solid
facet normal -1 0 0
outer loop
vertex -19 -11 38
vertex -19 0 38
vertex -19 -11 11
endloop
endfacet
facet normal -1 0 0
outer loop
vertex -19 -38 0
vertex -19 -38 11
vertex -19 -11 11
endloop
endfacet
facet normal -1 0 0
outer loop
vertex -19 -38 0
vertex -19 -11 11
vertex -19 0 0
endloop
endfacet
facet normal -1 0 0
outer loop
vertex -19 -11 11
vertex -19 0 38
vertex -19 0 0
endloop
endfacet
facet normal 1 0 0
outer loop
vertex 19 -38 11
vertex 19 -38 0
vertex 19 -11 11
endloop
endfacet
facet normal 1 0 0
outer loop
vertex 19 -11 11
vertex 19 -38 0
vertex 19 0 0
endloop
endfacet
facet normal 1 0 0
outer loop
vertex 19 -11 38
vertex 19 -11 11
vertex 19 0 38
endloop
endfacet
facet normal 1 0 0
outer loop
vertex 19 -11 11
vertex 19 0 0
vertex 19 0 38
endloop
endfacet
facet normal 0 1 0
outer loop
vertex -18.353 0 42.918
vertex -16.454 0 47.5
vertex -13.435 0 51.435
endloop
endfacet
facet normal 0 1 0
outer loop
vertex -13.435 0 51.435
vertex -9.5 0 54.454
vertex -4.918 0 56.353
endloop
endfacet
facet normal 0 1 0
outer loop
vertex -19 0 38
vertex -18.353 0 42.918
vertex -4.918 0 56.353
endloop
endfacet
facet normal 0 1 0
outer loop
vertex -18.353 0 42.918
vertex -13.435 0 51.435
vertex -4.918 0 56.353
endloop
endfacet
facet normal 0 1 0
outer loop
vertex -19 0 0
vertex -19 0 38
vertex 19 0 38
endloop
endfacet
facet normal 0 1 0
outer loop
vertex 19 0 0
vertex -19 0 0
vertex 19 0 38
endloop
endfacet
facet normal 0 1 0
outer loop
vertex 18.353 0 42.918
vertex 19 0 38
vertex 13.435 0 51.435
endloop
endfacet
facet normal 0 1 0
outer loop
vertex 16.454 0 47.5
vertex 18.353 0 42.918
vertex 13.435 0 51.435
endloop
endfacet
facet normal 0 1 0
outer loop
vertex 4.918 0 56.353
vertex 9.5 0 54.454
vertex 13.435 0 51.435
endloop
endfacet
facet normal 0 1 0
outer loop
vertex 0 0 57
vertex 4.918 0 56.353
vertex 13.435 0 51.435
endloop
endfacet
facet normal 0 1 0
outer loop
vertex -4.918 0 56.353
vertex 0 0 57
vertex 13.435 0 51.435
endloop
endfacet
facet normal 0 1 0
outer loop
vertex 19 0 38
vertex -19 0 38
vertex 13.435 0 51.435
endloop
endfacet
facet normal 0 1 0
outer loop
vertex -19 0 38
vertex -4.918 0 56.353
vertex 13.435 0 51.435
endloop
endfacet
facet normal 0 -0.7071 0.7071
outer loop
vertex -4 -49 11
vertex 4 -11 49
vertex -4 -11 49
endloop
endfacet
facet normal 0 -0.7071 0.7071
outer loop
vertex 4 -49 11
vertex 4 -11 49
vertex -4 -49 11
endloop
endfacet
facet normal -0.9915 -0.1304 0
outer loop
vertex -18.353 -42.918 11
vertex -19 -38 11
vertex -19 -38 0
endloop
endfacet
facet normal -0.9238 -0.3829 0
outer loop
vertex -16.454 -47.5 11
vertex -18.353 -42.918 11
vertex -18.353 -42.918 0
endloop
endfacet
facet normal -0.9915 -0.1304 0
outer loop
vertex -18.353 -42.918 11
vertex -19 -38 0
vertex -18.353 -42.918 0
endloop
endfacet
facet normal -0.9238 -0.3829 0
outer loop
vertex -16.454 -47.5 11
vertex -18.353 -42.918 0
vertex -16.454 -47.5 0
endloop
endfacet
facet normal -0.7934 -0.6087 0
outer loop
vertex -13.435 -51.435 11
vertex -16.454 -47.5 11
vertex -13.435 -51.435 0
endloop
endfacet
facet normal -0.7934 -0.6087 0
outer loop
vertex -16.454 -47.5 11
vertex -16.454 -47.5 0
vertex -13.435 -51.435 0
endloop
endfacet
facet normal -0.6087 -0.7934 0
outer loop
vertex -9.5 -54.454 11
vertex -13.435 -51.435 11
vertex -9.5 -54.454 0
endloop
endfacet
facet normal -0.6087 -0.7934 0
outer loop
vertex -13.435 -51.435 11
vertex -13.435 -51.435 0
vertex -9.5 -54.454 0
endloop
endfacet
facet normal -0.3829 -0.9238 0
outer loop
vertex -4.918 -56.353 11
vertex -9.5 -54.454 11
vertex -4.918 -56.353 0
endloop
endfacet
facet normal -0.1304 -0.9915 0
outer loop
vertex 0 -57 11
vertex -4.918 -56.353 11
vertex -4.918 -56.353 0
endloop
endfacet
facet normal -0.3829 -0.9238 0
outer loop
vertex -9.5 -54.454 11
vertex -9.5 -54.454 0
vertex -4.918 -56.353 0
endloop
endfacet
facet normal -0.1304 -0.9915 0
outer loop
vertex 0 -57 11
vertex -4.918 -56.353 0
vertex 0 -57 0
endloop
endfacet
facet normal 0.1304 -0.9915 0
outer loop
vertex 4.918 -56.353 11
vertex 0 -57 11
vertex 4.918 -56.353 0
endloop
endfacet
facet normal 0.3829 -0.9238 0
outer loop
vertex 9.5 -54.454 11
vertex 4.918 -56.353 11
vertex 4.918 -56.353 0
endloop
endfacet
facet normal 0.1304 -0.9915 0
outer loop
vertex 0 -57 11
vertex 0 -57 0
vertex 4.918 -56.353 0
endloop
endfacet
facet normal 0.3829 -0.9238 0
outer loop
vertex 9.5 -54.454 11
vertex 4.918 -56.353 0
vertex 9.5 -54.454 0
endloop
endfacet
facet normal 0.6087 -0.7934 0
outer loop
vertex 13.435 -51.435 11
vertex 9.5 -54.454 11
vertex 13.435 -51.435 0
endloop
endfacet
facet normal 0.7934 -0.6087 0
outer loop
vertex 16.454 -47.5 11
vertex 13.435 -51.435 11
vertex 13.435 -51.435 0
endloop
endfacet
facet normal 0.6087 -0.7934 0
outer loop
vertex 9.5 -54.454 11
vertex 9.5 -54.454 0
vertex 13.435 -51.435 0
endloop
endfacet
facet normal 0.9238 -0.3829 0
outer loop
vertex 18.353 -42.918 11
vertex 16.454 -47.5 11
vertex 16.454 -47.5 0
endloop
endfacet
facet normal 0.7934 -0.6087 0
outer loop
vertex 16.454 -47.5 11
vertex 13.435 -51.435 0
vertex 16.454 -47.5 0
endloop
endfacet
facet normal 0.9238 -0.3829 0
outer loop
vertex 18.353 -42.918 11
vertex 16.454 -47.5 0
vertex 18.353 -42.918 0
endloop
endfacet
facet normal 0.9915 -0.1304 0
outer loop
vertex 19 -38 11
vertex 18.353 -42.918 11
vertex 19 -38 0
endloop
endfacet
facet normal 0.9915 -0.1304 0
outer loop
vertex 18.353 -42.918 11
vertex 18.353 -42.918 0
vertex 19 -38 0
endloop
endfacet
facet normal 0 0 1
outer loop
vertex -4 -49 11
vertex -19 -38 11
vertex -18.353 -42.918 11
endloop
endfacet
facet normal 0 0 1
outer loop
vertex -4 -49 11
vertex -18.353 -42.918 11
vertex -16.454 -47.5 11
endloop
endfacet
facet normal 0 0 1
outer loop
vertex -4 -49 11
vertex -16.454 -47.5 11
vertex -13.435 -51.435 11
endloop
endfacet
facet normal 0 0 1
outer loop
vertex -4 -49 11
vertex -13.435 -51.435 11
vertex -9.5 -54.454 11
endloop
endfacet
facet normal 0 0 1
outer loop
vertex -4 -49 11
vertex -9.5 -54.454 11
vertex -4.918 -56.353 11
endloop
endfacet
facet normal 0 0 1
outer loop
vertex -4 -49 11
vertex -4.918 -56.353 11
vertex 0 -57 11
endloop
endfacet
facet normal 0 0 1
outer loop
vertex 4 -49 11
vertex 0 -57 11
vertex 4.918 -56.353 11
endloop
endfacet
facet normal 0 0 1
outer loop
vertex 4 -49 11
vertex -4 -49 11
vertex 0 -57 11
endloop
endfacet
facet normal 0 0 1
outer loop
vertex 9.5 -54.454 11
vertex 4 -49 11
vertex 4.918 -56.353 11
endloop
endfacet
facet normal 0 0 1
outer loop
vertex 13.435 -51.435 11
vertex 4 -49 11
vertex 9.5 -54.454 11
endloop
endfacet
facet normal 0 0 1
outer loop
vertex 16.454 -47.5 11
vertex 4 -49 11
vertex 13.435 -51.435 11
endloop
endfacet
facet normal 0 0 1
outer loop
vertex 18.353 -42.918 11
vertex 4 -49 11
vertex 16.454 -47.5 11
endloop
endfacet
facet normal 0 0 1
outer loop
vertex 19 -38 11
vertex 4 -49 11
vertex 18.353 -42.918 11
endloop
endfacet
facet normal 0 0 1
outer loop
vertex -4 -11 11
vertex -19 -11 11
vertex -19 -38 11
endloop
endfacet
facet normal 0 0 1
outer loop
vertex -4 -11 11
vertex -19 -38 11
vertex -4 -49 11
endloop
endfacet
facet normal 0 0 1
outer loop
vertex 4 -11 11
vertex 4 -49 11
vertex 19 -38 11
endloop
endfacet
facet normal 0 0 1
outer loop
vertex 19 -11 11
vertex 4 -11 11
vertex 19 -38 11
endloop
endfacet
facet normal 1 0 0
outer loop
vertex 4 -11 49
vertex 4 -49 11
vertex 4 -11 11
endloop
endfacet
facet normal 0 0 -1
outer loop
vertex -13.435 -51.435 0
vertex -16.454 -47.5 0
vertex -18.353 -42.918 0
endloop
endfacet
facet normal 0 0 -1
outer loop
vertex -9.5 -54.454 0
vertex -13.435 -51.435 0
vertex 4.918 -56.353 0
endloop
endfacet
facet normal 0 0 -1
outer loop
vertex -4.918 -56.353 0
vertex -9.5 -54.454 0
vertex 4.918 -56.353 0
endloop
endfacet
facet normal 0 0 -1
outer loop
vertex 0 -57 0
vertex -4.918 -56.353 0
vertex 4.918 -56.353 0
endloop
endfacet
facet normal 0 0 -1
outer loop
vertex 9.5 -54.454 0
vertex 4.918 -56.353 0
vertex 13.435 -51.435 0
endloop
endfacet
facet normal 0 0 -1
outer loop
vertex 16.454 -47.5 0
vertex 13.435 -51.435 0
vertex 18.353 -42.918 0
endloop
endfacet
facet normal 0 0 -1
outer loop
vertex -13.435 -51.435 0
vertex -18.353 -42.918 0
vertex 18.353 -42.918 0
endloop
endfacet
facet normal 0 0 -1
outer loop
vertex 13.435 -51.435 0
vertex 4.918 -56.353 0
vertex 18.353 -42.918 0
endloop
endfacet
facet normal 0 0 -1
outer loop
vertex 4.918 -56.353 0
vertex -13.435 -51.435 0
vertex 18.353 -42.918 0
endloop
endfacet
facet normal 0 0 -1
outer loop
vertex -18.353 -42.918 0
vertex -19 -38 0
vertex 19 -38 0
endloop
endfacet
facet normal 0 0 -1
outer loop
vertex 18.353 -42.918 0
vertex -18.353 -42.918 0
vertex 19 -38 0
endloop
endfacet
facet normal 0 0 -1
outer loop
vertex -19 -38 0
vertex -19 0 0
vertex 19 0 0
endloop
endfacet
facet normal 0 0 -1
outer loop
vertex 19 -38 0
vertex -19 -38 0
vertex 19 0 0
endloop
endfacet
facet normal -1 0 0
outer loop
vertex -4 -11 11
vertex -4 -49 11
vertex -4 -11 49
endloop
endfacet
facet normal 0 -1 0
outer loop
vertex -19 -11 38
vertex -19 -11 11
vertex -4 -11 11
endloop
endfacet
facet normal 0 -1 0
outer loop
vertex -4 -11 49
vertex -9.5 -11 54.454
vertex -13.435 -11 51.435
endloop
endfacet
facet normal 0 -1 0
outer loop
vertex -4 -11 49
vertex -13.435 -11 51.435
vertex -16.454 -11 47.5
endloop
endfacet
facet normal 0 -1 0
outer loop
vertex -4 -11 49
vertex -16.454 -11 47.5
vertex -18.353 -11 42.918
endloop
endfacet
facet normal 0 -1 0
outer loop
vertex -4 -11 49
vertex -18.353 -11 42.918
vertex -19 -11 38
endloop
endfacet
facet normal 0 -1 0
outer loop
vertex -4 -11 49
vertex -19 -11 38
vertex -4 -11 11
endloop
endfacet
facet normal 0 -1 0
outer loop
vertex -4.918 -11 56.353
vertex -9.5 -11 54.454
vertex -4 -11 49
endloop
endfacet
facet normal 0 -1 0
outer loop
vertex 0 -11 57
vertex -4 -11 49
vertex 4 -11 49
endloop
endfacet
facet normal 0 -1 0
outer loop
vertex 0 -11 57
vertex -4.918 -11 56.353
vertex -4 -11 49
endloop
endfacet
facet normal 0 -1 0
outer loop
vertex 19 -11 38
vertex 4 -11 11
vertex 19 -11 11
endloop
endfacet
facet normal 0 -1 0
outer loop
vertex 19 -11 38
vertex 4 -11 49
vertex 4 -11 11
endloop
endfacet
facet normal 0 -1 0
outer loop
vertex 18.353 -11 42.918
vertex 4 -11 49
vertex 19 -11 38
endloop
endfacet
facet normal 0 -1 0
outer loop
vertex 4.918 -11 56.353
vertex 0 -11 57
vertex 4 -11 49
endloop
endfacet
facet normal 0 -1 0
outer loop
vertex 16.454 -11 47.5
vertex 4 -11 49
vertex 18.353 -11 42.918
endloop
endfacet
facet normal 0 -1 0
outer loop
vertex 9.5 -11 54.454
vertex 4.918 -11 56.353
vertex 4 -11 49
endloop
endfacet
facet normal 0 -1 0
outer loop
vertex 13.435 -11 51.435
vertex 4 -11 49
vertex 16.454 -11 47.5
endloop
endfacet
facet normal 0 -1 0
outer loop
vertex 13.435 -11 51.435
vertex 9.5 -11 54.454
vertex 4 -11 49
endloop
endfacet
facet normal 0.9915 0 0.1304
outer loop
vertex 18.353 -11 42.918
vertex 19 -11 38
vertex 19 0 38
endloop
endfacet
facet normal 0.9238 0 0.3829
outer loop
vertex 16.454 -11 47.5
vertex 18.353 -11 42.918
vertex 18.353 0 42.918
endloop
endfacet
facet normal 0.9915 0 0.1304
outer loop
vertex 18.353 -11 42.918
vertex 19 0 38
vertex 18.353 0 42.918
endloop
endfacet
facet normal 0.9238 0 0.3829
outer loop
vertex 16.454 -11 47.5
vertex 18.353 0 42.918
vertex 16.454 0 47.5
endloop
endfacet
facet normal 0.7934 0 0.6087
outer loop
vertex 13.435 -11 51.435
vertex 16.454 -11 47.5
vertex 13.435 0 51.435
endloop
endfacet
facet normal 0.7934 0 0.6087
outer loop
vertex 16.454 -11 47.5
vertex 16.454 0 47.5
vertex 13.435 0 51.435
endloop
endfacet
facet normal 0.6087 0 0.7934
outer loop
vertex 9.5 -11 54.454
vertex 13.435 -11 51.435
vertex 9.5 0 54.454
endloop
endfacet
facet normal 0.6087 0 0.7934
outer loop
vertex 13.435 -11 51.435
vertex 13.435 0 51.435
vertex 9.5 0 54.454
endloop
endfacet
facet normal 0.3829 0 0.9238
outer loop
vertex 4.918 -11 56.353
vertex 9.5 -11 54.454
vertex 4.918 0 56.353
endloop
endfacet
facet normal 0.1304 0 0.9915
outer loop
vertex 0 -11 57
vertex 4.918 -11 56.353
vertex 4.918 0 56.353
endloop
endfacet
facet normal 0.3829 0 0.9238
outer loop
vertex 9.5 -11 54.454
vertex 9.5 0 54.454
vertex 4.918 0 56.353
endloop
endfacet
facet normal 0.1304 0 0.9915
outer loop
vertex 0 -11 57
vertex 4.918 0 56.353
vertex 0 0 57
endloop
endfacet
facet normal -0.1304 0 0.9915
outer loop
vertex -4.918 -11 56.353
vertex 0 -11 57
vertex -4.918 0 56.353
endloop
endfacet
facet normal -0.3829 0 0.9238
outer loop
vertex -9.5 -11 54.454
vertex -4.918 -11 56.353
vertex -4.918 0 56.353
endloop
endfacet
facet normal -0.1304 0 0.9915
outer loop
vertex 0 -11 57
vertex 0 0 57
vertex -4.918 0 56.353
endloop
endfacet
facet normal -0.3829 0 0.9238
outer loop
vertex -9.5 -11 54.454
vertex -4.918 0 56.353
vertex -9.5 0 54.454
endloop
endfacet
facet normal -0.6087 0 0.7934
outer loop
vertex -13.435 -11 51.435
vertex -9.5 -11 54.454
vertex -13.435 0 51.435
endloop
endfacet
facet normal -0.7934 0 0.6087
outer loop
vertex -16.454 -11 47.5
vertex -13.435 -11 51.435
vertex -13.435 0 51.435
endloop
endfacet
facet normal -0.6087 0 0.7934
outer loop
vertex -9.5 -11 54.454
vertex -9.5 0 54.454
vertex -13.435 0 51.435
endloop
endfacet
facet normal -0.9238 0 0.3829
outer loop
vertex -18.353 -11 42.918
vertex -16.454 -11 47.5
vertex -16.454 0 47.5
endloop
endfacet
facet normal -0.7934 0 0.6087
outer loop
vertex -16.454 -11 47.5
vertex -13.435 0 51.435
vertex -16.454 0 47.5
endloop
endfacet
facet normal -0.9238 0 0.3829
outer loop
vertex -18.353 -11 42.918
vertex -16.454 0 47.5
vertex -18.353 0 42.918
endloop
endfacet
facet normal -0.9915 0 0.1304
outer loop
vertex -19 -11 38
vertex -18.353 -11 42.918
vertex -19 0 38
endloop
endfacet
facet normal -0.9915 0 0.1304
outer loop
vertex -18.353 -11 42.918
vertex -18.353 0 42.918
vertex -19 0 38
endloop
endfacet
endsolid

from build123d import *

# Parameters (mm, degrees)
F1_DEPTH = 11
F3_DEPTH = 11
F5_DEPTH = 4


with BuildPart() as f1:
    # F0 (on Front) → F1 (new body)
    with BuildSketch(Plane.XZ):
        with BuildLine():
            Line((-19, 38), (-19, 0))
            Line((-19, 0), (19, 0))
            Line((19, 0), (19, 38))
            ThreePointArc((19, 38), (0, 57), (-19, 38))
        make_face()
    extrude(amount=F1_DEPTH)

    # F2 (on Top) → F3 (join)
    with BuildSketch(Plane.XY):
        with BuildLine():
            Line((19, 0), (-19, 0))
            Line((-19, 0), (-19, -38))
            ThreePointArc((-19, -38), (0, -57), (19, -38))
            Line((19, -38), (19, 0))
        make_face()
    extrude(amount=F3_DEPTH)

    # F4 (on Right) → F5 (join)
    with BuildSketch(Plane.YZ):
        Polygon((-11, 49), (-49, 11), (-11, 9.028562), align=None)
    extrude(amount=F5_DEPTH)

    # F6: F1 across plane


with BuildPart() as f1_1:
    add(f1.part)
    add(f1.part.mirror(Plane.YZ))


solid = f1_1.part
